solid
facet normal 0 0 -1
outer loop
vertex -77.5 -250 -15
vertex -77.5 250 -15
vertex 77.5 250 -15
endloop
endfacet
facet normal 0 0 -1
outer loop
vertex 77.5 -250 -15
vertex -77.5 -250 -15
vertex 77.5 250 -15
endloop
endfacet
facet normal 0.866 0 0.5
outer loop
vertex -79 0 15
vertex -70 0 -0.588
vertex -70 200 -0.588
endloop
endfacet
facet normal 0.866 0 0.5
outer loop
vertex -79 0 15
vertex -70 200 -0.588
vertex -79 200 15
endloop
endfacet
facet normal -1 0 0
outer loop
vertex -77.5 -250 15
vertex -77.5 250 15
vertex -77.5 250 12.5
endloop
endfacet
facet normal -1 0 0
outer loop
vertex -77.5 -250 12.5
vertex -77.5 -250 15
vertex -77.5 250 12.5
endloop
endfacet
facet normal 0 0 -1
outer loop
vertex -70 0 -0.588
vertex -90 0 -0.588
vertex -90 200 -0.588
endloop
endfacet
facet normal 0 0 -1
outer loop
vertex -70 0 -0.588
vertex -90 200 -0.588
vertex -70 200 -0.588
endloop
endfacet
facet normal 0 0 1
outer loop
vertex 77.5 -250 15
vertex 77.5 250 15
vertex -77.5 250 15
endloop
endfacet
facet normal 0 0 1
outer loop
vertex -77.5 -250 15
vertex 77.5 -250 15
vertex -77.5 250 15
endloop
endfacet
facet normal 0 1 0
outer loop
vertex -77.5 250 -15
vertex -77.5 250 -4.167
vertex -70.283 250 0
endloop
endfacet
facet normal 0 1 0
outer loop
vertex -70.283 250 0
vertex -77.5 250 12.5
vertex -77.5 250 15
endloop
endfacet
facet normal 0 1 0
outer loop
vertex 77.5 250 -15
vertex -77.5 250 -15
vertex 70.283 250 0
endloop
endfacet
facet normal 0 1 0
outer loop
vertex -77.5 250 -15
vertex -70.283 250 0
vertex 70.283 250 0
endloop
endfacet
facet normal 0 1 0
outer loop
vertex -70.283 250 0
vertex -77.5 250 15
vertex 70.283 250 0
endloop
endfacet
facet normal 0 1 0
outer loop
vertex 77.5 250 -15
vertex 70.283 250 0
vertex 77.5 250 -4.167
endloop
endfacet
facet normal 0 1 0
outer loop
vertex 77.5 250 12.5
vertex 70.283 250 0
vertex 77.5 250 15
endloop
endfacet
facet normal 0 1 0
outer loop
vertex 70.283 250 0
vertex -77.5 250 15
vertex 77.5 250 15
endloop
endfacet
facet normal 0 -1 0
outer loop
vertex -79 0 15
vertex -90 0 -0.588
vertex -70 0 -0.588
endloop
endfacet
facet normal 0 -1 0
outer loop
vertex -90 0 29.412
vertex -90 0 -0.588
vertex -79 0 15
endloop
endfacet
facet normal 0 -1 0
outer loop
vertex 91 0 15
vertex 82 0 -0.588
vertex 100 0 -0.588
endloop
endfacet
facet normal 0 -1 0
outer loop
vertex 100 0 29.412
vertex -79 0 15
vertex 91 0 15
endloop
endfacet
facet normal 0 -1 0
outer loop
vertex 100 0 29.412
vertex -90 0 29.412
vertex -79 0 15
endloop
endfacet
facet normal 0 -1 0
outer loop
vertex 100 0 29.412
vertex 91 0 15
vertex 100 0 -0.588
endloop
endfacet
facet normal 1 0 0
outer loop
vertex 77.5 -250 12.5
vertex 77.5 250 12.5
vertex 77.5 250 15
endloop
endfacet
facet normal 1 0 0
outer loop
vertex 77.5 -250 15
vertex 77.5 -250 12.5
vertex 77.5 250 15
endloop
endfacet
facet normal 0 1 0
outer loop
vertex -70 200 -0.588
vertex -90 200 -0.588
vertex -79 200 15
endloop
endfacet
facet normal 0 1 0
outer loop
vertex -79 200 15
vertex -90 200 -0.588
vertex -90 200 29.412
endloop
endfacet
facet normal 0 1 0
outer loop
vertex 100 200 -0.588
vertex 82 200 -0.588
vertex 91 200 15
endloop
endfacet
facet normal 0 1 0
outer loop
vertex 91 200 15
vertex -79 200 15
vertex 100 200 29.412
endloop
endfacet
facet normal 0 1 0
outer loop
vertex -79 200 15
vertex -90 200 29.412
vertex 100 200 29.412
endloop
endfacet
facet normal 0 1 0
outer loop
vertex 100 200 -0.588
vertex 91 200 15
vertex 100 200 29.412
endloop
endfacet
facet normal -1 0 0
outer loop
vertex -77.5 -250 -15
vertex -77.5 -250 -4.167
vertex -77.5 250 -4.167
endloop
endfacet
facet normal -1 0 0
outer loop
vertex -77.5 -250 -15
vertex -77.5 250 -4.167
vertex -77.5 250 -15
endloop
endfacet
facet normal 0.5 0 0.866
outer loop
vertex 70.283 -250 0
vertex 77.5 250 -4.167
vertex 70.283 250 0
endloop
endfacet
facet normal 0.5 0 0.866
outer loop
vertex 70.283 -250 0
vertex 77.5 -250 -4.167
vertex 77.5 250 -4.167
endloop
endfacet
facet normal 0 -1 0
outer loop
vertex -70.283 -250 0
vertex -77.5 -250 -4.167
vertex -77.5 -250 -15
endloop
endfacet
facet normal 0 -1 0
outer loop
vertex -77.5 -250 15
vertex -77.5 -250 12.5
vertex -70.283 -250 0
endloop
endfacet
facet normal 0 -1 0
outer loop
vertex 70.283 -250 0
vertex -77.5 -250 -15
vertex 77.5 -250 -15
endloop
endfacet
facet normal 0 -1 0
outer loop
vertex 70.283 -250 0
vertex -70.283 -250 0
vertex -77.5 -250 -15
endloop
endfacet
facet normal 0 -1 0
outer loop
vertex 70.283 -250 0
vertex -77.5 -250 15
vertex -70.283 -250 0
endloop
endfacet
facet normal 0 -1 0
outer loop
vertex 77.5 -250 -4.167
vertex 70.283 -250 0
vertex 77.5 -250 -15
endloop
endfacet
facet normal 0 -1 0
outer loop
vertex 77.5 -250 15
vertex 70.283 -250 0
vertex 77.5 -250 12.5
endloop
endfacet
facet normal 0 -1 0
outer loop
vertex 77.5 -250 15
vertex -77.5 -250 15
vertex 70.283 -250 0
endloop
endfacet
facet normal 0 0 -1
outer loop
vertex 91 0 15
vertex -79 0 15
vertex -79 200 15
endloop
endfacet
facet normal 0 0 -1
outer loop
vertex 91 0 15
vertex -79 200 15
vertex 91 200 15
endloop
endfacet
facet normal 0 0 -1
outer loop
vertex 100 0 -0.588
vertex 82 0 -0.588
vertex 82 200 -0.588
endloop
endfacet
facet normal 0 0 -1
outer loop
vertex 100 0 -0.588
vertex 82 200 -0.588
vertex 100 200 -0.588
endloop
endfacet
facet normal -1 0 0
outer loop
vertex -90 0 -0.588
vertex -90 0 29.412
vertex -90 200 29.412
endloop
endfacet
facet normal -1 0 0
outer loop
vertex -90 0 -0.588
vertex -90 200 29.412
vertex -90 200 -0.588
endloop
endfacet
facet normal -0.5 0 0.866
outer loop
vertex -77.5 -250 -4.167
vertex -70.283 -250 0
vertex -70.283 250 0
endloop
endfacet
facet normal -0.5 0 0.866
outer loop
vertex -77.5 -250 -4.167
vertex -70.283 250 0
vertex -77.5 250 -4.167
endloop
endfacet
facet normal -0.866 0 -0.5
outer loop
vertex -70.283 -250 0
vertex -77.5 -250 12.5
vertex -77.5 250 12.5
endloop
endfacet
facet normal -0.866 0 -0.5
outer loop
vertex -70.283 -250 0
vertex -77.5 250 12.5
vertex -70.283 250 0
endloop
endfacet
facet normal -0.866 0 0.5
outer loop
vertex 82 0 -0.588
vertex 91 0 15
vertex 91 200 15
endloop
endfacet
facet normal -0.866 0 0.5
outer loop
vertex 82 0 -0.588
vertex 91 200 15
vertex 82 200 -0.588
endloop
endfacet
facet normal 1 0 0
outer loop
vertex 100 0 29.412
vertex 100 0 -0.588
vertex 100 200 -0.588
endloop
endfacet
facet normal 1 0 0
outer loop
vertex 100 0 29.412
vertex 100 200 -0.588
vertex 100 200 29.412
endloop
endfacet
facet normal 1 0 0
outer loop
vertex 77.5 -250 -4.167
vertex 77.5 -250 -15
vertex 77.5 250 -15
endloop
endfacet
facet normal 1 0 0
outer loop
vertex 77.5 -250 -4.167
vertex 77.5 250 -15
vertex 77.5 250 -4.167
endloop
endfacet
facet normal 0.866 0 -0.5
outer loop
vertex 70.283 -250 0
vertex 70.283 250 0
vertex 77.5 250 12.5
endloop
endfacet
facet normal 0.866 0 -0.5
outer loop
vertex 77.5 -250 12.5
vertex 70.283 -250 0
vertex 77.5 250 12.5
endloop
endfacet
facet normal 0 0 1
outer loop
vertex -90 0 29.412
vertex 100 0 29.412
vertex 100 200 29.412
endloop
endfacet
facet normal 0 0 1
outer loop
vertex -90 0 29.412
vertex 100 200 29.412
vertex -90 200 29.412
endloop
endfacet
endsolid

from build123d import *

# Parameters (mm, degrees)
F1_DEPTH = 250
F3_DEPTH = 200


with BuildPart() as f1:
    # F0 (on Front) → F1 (new body, symmetric)
    with BuildSketch(Plane.XZ):
        Polygon((77.5, 12.5), (77.5, 15), (-77.5, 15), (-77.5, 12.5), (-70.283122, 0), (-77.5, -4.166667), (-77.5, -15), (77.5, -15), (77.5, -4.166667), (70.283122, 0), align=None)
    extrude(amount=F1_DEPTH, both=True)


with BuildPart() as f3:
    # F2 (on Front) → F3 (new body)
    with BuildSketch(Plane.XZ):
        Polygon((-90, 29.411543), (-90, -0.588457), (-70, -0.588457), (-79, 15), (91, 15), (82, -0.588457), (100, -0.588457), (100, 29.411543), align=None)
    extrude(amount=-F3_DEPTH)


solid = Compound([f1.part, f3.part])
